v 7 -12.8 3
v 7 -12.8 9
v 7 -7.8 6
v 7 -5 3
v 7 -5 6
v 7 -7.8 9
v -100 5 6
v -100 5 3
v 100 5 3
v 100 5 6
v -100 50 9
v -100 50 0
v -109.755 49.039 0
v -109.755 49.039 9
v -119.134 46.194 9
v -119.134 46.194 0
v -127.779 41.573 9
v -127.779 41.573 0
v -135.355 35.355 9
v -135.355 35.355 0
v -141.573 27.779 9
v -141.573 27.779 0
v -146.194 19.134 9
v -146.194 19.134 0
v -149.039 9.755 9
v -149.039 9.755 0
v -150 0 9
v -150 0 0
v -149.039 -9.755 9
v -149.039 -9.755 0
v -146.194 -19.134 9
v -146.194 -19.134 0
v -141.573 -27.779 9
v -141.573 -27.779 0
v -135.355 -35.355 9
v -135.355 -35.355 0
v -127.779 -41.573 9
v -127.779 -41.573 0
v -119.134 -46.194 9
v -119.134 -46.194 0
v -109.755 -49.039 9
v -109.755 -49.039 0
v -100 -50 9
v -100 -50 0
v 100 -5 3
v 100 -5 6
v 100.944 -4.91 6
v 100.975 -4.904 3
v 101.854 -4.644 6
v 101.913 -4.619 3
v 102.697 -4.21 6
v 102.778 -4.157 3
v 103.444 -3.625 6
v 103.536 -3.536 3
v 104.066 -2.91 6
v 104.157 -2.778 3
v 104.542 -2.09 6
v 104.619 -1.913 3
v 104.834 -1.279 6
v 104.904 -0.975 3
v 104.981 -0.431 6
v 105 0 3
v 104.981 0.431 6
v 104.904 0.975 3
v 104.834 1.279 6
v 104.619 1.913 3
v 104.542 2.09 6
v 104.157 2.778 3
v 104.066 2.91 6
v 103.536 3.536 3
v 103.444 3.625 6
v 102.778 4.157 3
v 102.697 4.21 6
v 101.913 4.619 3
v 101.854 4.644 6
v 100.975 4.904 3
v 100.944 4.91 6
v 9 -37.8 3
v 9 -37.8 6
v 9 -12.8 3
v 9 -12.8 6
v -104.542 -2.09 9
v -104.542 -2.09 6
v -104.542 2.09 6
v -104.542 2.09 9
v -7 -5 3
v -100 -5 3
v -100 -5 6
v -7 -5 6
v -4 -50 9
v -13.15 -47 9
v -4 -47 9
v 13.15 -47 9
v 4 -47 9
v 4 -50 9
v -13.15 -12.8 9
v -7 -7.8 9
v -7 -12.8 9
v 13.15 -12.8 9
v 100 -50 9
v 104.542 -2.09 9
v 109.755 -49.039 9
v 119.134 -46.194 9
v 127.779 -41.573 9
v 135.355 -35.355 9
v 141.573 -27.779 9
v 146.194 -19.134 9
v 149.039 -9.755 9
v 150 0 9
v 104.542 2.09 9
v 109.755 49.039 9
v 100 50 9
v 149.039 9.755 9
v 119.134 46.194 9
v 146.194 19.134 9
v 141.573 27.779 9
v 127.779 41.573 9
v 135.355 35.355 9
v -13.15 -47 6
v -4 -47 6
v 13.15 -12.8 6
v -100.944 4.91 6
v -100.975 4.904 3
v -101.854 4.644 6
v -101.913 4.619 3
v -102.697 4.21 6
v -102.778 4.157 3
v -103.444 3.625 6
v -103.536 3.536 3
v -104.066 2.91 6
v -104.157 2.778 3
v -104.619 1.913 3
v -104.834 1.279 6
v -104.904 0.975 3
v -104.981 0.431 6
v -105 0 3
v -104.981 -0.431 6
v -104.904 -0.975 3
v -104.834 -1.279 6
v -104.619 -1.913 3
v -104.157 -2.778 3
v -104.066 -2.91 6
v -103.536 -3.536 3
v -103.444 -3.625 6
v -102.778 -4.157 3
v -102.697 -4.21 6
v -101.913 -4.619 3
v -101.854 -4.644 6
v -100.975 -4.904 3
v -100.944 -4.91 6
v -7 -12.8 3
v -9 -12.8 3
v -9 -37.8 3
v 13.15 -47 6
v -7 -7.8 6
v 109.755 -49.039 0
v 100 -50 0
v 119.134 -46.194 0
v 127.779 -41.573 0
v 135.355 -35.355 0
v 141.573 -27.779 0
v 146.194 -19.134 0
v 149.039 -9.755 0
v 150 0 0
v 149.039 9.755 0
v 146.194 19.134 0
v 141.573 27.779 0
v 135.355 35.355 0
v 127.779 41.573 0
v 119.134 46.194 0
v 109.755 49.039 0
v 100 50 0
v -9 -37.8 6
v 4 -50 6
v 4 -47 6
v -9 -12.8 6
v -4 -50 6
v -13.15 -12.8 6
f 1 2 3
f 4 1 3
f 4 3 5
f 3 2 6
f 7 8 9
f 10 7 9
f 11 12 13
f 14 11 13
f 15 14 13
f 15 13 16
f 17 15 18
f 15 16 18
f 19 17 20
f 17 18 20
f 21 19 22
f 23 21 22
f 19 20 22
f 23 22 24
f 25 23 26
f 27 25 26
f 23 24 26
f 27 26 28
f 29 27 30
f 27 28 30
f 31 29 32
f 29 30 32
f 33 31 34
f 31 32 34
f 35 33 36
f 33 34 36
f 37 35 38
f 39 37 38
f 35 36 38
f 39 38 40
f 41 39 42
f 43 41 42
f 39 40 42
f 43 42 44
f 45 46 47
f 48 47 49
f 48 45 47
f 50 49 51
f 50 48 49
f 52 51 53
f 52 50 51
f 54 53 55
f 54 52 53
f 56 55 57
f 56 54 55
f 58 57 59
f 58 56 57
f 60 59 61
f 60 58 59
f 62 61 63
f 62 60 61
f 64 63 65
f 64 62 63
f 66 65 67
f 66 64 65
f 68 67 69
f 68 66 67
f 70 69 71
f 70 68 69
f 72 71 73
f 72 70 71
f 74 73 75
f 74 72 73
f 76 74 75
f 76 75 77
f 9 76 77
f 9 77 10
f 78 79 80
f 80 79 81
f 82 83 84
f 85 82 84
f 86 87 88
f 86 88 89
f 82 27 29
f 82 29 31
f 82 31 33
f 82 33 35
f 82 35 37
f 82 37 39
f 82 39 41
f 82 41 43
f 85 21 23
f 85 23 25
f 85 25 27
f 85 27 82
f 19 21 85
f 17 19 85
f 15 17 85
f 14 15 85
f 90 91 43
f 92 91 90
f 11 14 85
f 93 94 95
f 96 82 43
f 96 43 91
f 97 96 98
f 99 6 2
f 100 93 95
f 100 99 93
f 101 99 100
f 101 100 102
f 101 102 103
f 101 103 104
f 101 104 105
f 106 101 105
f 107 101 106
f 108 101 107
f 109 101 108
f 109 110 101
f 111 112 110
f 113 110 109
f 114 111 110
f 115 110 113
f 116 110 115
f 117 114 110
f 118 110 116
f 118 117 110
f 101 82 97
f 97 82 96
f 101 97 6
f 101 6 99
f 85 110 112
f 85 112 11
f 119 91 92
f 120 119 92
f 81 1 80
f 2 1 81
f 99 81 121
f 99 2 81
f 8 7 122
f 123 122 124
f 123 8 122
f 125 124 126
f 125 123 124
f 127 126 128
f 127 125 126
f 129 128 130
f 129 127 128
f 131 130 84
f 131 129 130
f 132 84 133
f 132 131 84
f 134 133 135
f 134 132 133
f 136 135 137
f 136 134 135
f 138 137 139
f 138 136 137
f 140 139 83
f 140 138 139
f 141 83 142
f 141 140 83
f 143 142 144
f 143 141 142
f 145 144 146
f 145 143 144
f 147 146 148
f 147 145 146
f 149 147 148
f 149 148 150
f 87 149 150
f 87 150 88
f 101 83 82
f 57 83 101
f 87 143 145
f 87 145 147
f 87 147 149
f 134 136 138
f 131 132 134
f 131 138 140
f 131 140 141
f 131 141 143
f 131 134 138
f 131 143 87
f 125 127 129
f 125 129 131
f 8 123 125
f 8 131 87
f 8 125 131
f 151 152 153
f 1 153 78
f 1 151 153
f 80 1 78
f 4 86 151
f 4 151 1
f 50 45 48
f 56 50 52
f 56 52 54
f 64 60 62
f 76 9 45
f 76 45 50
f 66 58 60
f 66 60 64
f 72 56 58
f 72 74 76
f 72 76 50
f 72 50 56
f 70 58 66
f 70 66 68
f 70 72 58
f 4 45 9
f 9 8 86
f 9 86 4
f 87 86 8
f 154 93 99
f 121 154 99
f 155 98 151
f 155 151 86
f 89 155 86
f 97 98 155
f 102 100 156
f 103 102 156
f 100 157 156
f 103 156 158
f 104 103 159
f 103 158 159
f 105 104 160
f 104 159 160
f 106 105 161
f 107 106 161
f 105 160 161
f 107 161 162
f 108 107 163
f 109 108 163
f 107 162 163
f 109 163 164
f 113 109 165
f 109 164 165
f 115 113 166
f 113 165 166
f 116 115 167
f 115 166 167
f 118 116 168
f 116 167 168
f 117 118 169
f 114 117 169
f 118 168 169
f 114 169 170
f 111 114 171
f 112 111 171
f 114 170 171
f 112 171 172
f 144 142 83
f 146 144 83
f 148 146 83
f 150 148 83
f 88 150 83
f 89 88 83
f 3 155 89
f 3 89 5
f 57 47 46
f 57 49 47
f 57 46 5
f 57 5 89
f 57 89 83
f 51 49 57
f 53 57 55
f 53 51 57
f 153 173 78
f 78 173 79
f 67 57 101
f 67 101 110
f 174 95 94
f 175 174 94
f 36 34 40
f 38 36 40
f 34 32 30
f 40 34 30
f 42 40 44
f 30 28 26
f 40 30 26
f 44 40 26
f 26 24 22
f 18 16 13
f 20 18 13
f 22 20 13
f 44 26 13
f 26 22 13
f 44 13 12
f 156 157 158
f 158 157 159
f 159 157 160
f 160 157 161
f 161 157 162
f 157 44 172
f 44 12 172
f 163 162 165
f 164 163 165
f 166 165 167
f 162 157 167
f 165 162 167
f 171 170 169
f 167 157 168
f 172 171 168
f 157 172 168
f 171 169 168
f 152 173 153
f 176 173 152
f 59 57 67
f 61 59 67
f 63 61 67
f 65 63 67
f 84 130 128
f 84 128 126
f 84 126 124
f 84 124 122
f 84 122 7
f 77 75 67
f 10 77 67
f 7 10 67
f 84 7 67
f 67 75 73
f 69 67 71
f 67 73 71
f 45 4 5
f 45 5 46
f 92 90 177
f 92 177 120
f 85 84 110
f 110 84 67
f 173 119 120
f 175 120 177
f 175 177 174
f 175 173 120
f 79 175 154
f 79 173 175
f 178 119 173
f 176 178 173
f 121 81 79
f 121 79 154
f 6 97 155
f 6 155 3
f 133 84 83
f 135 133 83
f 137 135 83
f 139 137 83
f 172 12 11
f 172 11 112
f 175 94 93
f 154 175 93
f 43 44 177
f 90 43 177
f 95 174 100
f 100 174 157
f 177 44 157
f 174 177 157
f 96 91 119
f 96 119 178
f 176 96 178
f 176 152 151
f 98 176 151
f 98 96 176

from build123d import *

# Parameters (mm, degrees)
PAD_DEPTH       = 3
PAD001_DEPTH    = 3
SKETCH002_W     = 209.08447
SKETCH002_H     = 4.18
PAD002_DEPTH    = 3
SKETCH003_W     = 26.3
SKETCH003_H     = 34.2
POCKET_DEPTH    = 3
SKETCH004_W     = 18
SKETCH004_H     = 25
POCKET001_DEPTH = 3
SKETCH005_W     = 14
SKETCH005_H     = 5
POCKET002_DEPTH = 6
SKETCH006_W     = 14
SKETCH006_H     = 3
POCKET003_DEPTH = 3
SKETCH007_W     = 8
SKETCH007_H     = 3
POCKET004_DEPTH = 3


with BuildPart() as part:
    # Sketch → Pad (new body)
    with BuildSketch(Plane.XY):
        with BuildLine():
            ThreePointArc((-100, 50), (-150, 0), (-100, -50))
            Line((-100, -50), (100, -50))
            ThreePointArc((100, -50), (150, 0), (100, 50))
            Line((-100, 50), (100, 50))
        make_face()
    extrude(amount=PAD_DEPTH)

    # Sketch001 (on Face6 of Pad) → Pad001 (join)
    with BuildSketch(Plane.XY.offset(3)):
        with BuildLine():
            ThreePointArc((-100, 50), (-150, 0), (-100, -50))
            Line((-100, -50), (100, -50))
            ThreePointArc((100, -50), (150, 0), (100, 50))
            Line((-100, 50), (100, 50))
        make_face()
        with BuildLine():
            ThreePointArc((-100, 5), (-105, 0), (-100, -5))
            Line((-100, -5), (100, -5))
            ThreePointArc((100, -5), (105, 0), (100, 5))
            Line((-100, 5), (100, 5))
        make_face(mode=Mode.SUBTRACT)
    extrude(amount=PAD001_DEPTH)

    # Sketch002 (on Face9 of Pad001) → Pad002 (join)
    with BuildSketch(Plane.XY.offset(6)):
        with BuildLine():
            ThreePointArc((-100, 50), (-150, 0), (-100, -50))
            Line((-100, -50), (100, -50))
            ThreePointArc((100, -50), (150, 0), (100, 50))
            Line((-100, 50), (100, 50))
        make_face()
        Rectangle(SKETCH002_W, SKETCH002_H, mode=Mode.SUBTRACT)
    extrude(amount=PAD002_DEPTH)

    # Sketch003 (on Face13 of Pad002) → Pocket (cut)
    with BuildSketch(Plane.XY.offset(9)):
        with Locations((0, -29.9)):
            Rectangle(SKETCH003_W, SKETCH003_H)
    extrude(amount=-POCKET_DEPTH, mode=Mode.SUBTRACT)

    # Sketch004 (on Face27 of Pocket) → Pocket001 (cut)
    with BuildSketch(Plane.XY.offset(6)):
        with Locations((0, -25.3)):
            Rectangle(SKETCH004_W, SKETCH004_H)
    extrude(amount=-POCKET001_DEPTH, mode=Mode.SUBTRACT)

    # Sketch005 (on Face13 of Pocket001) → Pocket002 (cut)
    with BuildSketch(Plane.XY.offset(9)):
        with Locations((0, -10.3)):
            Rectangle(SKETCH005_W, SKETCH005_H)
    extrude(amount=-POCKET002_DEPTH, mode=Mode.SUBTRACT)

    # Sketch006 (on Face23 of Pocket002) → Pocket003 (cut)
    with BuildSketch(Plane.XZ.offset(7.8)):
        with Locations((0, 4.5)):
            Rectangle(SKETCH006_W, SKETCH006_H)
    extrude(amount=-POCKET003_DEPTH, mode=Mode.SUBTRACT)

    # Sketch007 (on Face13 of Pocket003) → Pocket004 (cut)
    with BuildSketch(Plane.XY.offset(9)):
        with Locations((0, -48.5)):
            Rectangle(SKETCH007_W, SKETCH007_H)
    extrude(amount=-POCKET004_DEPTH, mode=Mode.SUBTRACT)


solid = part.part
